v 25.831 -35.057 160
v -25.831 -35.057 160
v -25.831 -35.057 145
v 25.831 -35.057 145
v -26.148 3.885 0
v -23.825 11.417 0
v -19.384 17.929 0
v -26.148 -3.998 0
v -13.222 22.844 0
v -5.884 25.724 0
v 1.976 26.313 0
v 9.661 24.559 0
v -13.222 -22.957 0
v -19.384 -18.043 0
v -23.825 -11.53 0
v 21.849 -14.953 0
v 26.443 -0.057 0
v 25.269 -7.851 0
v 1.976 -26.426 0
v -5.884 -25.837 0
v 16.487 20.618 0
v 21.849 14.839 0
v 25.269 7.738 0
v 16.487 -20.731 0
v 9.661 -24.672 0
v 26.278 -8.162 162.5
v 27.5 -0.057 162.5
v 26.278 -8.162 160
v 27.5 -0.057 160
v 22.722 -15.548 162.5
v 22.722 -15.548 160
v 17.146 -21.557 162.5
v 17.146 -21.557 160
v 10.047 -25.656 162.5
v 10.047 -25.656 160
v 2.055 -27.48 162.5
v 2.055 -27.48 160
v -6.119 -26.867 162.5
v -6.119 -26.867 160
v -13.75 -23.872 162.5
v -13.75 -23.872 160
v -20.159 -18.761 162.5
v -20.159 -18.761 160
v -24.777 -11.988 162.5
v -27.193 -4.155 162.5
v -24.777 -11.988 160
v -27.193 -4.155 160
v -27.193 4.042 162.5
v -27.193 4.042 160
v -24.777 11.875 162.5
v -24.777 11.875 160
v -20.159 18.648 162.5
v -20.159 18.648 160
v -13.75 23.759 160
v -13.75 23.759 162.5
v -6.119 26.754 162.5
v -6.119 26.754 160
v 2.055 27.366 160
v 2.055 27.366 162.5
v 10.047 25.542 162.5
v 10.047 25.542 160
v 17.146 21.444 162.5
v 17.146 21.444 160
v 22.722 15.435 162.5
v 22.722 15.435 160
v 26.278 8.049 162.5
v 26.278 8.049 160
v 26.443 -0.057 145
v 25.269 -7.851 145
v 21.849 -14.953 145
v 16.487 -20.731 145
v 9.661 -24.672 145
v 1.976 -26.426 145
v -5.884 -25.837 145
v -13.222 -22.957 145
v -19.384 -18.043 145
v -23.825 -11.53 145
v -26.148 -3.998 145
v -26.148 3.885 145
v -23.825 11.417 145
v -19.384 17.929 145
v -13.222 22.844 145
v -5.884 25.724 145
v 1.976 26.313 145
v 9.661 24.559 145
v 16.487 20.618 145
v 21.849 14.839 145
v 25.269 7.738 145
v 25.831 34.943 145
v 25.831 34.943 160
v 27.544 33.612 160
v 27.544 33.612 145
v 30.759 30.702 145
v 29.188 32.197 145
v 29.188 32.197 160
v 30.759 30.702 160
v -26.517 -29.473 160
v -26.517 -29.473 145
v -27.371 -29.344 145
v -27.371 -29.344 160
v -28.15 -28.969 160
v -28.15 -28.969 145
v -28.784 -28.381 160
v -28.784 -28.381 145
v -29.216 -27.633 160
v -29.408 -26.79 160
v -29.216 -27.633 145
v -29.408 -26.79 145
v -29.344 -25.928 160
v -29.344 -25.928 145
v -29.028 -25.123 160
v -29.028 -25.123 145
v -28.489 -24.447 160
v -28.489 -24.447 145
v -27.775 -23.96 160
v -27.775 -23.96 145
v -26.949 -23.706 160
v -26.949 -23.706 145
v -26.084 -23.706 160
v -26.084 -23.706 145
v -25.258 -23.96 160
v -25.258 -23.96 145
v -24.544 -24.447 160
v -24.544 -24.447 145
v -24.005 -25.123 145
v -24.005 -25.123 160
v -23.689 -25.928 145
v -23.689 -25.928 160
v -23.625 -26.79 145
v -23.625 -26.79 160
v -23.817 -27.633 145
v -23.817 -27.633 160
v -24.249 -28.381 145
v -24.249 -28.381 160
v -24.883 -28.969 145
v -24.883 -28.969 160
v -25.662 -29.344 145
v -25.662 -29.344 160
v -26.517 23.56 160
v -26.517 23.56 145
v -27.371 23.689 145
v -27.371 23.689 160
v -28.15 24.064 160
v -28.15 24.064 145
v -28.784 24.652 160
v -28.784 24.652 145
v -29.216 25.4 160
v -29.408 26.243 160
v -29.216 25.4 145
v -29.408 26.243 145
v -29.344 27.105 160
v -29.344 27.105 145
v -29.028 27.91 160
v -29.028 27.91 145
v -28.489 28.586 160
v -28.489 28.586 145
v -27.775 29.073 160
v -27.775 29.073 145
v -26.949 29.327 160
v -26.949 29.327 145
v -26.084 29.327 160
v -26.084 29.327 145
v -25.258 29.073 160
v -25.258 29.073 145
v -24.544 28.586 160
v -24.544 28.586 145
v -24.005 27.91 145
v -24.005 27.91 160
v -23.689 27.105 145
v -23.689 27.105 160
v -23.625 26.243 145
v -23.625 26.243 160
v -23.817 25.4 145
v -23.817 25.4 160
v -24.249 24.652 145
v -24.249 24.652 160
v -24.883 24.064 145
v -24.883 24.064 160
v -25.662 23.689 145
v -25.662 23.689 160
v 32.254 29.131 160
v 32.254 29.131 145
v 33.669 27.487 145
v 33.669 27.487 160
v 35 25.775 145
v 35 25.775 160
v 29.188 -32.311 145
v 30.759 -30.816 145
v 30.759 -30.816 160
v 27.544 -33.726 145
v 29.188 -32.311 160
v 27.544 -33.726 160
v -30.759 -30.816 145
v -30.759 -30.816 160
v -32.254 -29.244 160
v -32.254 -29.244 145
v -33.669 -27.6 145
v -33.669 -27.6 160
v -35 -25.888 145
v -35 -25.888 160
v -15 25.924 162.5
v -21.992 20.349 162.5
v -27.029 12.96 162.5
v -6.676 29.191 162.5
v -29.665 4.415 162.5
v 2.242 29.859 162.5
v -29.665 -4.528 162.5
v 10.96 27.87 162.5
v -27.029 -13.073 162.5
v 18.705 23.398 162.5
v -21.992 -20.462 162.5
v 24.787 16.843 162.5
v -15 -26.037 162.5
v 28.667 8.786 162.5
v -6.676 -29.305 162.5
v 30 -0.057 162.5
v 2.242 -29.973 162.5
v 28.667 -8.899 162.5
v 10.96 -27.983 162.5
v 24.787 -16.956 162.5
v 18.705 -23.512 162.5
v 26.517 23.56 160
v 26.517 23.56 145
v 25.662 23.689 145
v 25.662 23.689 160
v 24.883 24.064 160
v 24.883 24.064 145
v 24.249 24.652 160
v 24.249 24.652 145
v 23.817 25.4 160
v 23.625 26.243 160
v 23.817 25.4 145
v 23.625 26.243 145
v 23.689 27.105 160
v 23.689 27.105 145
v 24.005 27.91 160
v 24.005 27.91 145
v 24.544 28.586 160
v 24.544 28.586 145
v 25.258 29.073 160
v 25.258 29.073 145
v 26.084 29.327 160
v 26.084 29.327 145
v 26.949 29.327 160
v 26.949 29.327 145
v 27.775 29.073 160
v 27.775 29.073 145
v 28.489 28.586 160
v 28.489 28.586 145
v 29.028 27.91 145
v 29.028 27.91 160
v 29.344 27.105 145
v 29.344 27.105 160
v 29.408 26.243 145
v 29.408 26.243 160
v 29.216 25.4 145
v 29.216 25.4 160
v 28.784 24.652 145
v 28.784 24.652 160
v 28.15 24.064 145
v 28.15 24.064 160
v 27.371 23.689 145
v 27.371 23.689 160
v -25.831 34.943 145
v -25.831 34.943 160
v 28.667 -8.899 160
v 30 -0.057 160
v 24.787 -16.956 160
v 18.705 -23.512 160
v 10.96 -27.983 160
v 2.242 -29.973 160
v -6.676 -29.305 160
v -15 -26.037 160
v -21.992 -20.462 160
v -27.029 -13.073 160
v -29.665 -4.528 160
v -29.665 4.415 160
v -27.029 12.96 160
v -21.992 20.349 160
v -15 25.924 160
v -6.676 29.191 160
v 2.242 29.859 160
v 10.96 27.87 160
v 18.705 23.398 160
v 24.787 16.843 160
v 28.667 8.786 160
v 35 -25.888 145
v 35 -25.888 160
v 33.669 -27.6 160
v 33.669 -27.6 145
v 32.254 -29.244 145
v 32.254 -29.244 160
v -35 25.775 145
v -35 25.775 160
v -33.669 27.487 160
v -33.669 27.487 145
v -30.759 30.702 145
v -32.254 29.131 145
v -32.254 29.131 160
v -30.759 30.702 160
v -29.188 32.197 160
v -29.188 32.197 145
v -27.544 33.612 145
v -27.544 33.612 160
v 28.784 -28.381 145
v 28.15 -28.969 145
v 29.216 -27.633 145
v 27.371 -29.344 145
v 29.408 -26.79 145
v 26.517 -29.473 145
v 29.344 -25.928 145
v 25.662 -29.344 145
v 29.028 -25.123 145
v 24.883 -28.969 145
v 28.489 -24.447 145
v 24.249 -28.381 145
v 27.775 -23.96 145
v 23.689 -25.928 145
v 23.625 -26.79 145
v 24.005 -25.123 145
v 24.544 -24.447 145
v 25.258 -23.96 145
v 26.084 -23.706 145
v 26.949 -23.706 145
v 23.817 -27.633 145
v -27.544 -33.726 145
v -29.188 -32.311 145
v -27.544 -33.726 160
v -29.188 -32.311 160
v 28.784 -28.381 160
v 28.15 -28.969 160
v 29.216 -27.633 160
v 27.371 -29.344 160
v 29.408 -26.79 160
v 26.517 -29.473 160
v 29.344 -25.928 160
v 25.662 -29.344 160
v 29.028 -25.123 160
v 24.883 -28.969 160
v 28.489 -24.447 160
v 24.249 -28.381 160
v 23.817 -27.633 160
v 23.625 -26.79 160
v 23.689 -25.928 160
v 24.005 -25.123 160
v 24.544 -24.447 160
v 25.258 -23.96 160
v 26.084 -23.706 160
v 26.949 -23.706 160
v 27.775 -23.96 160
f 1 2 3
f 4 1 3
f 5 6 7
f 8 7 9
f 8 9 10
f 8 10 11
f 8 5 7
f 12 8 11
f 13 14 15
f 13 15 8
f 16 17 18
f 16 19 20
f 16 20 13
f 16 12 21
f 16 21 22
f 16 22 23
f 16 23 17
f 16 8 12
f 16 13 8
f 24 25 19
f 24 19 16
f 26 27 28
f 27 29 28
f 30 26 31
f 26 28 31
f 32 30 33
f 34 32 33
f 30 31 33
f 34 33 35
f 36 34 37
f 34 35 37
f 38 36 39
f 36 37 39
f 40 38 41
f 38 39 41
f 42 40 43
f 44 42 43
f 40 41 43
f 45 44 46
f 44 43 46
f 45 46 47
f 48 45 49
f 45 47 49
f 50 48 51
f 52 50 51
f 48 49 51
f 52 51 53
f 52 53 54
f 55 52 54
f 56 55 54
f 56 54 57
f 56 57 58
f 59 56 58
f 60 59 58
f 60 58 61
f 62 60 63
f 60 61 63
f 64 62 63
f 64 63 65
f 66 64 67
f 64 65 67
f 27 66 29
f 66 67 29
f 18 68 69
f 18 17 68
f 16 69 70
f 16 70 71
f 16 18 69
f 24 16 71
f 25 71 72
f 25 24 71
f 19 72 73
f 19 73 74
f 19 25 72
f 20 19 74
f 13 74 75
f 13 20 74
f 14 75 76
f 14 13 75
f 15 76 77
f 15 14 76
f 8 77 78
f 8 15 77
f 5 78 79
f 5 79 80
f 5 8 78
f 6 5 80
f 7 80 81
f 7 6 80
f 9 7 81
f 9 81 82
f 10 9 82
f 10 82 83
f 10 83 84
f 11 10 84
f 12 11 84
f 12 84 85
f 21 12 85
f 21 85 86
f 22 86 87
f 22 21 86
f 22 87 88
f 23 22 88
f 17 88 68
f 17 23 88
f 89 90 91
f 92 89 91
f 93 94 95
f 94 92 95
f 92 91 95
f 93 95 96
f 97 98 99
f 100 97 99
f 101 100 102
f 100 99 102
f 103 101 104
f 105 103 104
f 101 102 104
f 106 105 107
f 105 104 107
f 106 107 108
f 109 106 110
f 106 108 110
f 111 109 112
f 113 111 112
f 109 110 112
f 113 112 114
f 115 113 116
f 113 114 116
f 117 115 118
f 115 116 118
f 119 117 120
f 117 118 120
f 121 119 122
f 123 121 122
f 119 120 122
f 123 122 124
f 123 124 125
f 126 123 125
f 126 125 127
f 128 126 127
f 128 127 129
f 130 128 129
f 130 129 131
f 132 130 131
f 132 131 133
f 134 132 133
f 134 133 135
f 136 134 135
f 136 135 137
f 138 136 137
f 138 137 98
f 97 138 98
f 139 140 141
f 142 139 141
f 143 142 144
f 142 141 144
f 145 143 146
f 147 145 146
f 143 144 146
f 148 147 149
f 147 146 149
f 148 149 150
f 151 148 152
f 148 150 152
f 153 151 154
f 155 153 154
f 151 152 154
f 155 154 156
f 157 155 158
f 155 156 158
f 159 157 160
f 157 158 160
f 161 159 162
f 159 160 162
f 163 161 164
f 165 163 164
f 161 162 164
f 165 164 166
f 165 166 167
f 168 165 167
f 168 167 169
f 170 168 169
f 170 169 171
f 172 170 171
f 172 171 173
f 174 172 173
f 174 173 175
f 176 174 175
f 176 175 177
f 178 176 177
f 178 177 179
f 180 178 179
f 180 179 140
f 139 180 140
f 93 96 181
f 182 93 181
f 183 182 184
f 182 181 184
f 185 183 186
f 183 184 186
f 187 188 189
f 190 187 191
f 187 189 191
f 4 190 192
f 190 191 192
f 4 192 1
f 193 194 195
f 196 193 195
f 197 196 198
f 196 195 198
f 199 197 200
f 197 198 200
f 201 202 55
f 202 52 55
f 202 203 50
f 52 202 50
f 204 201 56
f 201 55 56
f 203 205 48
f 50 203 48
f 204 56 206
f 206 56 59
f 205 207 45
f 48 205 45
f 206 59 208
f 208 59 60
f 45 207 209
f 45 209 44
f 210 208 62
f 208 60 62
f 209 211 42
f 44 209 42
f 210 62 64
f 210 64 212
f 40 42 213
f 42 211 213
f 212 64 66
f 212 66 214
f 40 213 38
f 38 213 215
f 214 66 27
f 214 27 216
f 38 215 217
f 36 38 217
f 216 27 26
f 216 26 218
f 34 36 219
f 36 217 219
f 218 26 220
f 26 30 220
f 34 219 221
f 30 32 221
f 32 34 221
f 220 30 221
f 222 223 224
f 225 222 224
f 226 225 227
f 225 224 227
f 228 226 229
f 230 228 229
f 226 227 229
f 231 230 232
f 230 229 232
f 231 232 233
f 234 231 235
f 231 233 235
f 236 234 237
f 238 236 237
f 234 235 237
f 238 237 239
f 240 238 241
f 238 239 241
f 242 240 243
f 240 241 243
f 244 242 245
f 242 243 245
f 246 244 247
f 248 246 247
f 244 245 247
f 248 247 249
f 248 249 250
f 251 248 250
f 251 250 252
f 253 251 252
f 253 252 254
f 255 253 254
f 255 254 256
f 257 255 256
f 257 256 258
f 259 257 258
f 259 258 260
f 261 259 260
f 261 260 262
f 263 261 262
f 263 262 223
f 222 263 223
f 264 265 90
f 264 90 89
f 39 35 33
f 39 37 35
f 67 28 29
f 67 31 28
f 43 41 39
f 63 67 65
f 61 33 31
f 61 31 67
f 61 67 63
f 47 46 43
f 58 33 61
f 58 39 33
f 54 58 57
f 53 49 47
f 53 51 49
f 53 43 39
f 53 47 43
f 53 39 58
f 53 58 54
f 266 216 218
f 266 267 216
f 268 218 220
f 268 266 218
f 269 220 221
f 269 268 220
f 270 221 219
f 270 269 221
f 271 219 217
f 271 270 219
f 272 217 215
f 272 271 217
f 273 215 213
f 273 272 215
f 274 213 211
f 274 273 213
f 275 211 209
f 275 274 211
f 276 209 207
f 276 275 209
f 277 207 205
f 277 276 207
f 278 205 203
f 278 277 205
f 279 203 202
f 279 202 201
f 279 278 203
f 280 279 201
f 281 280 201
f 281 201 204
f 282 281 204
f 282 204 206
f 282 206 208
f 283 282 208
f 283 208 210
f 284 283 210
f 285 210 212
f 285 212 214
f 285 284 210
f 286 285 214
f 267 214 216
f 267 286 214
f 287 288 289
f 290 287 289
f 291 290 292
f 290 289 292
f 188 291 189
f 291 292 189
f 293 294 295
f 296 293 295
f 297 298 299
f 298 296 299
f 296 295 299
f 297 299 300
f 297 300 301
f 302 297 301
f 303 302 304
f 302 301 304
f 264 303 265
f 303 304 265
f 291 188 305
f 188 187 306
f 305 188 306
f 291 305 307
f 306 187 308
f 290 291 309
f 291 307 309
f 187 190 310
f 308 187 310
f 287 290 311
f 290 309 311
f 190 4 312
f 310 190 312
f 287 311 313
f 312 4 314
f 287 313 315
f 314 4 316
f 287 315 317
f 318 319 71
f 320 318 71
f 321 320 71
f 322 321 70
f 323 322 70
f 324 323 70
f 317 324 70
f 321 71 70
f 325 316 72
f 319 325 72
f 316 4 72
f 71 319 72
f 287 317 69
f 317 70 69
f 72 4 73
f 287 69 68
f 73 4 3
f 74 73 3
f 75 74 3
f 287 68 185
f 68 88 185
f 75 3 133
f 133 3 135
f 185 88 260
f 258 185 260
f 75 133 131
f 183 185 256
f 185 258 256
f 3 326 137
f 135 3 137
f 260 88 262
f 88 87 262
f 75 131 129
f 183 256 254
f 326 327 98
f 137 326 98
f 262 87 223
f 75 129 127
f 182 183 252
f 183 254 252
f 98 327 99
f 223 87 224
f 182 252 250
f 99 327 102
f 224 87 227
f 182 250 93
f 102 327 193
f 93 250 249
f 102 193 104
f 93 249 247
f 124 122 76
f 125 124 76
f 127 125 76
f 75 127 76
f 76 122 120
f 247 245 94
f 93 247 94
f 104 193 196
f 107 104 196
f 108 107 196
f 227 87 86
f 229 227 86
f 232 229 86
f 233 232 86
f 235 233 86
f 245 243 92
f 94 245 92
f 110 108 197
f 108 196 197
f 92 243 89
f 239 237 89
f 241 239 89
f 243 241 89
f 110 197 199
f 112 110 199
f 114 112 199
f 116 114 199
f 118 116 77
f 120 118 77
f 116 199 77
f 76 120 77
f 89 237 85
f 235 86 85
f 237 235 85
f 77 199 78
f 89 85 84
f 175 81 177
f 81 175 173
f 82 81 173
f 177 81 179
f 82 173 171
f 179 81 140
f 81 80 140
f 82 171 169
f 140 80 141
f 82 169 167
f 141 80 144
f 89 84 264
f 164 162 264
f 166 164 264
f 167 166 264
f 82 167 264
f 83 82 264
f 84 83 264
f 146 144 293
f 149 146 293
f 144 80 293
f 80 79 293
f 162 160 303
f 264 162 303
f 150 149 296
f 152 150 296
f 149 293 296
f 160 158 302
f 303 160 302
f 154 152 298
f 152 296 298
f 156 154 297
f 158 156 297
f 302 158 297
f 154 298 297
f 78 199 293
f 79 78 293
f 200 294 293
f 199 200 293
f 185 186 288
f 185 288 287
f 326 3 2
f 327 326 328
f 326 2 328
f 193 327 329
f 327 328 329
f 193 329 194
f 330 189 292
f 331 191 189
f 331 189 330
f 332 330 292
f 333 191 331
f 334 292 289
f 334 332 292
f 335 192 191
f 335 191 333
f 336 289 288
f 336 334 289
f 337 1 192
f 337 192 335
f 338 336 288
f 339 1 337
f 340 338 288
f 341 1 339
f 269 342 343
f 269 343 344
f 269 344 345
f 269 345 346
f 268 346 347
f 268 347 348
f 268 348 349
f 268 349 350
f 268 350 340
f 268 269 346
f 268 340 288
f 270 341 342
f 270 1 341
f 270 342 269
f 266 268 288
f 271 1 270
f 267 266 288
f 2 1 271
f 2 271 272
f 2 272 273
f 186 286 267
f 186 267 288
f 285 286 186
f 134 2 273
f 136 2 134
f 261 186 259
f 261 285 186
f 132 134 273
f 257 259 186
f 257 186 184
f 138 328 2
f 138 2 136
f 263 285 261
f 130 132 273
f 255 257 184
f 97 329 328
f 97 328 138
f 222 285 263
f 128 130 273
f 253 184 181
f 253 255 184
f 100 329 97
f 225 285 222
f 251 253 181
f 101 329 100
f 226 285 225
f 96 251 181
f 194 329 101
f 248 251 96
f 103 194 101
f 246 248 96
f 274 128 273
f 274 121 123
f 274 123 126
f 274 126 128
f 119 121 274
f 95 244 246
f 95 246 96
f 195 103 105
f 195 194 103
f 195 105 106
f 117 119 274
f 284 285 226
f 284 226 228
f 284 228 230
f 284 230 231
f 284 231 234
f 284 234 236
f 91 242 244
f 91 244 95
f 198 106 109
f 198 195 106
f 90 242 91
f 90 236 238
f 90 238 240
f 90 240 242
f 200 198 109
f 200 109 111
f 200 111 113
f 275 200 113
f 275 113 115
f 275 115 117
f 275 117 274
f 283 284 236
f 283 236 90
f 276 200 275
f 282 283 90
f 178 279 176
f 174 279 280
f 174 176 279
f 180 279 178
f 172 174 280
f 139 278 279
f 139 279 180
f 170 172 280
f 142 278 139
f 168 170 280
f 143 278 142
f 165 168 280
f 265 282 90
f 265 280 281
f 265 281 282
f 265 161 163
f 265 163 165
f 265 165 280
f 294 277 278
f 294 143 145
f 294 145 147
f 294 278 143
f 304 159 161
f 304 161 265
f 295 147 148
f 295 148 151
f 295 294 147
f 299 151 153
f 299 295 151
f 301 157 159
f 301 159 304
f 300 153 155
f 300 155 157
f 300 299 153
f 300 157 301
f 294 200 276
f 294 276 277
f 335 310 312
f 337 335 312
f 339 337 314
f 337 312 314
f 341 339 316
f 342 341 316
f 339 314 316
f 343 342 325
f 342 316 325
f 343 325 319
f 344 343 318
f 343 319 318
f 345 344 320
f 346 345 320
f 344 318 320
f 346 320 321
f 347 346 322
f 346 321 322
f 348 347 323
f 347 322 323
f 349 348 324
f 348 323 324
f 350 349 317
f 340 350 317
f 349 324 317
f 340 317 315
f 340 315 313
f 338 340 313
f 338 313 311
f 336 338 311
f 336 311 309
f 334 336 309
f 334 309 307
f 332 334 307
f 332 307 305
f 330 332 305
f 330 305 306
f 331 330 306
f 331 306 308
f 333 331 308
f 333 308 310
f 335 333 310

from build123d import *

# Parameters (mm, degrees)
SKETCH_2_W              = 2.5
SKETCH_2_H              = 2.5
SKETCH_2_W_2            = 145
SKETCH_2_H_2            = 26.443328262
EXTRUDE_1_DEPTH         = 35
EXTRUDE_1_DEPTH_BACK    = 35
SKETCH_2_4_W            = 15
SKETCH_2_4_H            = 70
CUT_EXTRUDE_1_DEPTH     = 168.493194588
HOLE_WIZARD_5_8_5_8_1_D = 5.8


with BuildPart() as part:
    # Эскиз2 → Повернуть2 (revolve)
    with BuildSketch(Plane(origin=(0, 0, 0), x_dir=(0, 0, -1), z_dir=(1, 0, 0))):
        with Locations((-161.25, -28.806671738)):
            Rectangle(SKETCH_2_W, SKETCH_2_H)
        with Locations((-72.5, -13.278335869)):
            Rectangle(SKETCH_2_W_2, SKETCH_2_H_2)
    revolve(axis=Axis((0, -0.056671738, 165.890142235), (0, 0, -1)))

    # Эскиз2<4> → Бобышка-Вытянуть1 (add, two sides: drawn at the far end of the back side and taken through both)
    with BuildSketch(Plane(origin=(0, 0, 0), x_dir=(0, 0, -1), z_dir=(1, 0, 0)).offset(-EXTRUDE_1_DEPTH_BACK)):
        with Locations((-152.5, -0.056671738)):
            Rectangle(SKETCH_2_4_W, SKETCH_2_4_H)
    extrude(amount=EXTRUDE_1_DEPTH + EXTRUDE_1_DEPTH_BACK)

    # Эскиз4 → Вырез-Вытянуть1 (cut, through all)
    with BuildSketch(Plane.XY.offset(160)):
        with BuildLine():
            ThreePointArc((35, -25.887854444), (30.759144982, -30.815816719), (25.831182706, -35.056671738))
            Line((25.831182706, -35.056671738), (35, -35.056671738))
            Line((35, -35.056671738), (35, -25.887854444))
        make_face()
        with BuildLine():
            Line((-35, -35.056671738), (-25.831182706, -35.056671738))
            ThreePointArc((-25.831182706, -35.056671738), (-30.759144982, -30.815816719), (-35, -25.887854444))
            Line((-35, -25.887854444), (-35, -35.056671738))
        make_face()
        with BuildLine():
            ThreePointArc((25.831182706, 34.943328262), (30.759144982, 30.702473244), (35, 25.774510968))
            Line((35, 25.774510968), (35, 34.943328262))
            Line((35, 34.943328262), (25.831182706, 34.943328262))
        make_face()
        with BuildLine():
            ThreePointArc((-35, 25.774510968), (-30.759144982, 30.702473244), (-25.831182706, 34.943328262))
            Line((-25.831182706, 34.943328262), (-35, 34.943328262))
            Line((-35, 34.943328262), (-35, 25.774510968))
        make_face()
    extrude(amount=-CUT_EXTRUDE_1_DEPTH, mode=Mode.SUBTRACT)

    # Диаметр отверстия Ø5.8 (5.8)1 (through all)
    with Locations(Plane(origin=(-26.516504294, -26.573176032, 160), x_dir=(0, 1, 0), z_dir=(0, 0, 1))):
        with Locations((0, 0), (0, -53.033008588), (53.033008589, -53.033008588), (53.033008589, 0)):
            Hole(HOLE_WIZARD_5_8_5_8_1_D / 2)


solid = part.part
